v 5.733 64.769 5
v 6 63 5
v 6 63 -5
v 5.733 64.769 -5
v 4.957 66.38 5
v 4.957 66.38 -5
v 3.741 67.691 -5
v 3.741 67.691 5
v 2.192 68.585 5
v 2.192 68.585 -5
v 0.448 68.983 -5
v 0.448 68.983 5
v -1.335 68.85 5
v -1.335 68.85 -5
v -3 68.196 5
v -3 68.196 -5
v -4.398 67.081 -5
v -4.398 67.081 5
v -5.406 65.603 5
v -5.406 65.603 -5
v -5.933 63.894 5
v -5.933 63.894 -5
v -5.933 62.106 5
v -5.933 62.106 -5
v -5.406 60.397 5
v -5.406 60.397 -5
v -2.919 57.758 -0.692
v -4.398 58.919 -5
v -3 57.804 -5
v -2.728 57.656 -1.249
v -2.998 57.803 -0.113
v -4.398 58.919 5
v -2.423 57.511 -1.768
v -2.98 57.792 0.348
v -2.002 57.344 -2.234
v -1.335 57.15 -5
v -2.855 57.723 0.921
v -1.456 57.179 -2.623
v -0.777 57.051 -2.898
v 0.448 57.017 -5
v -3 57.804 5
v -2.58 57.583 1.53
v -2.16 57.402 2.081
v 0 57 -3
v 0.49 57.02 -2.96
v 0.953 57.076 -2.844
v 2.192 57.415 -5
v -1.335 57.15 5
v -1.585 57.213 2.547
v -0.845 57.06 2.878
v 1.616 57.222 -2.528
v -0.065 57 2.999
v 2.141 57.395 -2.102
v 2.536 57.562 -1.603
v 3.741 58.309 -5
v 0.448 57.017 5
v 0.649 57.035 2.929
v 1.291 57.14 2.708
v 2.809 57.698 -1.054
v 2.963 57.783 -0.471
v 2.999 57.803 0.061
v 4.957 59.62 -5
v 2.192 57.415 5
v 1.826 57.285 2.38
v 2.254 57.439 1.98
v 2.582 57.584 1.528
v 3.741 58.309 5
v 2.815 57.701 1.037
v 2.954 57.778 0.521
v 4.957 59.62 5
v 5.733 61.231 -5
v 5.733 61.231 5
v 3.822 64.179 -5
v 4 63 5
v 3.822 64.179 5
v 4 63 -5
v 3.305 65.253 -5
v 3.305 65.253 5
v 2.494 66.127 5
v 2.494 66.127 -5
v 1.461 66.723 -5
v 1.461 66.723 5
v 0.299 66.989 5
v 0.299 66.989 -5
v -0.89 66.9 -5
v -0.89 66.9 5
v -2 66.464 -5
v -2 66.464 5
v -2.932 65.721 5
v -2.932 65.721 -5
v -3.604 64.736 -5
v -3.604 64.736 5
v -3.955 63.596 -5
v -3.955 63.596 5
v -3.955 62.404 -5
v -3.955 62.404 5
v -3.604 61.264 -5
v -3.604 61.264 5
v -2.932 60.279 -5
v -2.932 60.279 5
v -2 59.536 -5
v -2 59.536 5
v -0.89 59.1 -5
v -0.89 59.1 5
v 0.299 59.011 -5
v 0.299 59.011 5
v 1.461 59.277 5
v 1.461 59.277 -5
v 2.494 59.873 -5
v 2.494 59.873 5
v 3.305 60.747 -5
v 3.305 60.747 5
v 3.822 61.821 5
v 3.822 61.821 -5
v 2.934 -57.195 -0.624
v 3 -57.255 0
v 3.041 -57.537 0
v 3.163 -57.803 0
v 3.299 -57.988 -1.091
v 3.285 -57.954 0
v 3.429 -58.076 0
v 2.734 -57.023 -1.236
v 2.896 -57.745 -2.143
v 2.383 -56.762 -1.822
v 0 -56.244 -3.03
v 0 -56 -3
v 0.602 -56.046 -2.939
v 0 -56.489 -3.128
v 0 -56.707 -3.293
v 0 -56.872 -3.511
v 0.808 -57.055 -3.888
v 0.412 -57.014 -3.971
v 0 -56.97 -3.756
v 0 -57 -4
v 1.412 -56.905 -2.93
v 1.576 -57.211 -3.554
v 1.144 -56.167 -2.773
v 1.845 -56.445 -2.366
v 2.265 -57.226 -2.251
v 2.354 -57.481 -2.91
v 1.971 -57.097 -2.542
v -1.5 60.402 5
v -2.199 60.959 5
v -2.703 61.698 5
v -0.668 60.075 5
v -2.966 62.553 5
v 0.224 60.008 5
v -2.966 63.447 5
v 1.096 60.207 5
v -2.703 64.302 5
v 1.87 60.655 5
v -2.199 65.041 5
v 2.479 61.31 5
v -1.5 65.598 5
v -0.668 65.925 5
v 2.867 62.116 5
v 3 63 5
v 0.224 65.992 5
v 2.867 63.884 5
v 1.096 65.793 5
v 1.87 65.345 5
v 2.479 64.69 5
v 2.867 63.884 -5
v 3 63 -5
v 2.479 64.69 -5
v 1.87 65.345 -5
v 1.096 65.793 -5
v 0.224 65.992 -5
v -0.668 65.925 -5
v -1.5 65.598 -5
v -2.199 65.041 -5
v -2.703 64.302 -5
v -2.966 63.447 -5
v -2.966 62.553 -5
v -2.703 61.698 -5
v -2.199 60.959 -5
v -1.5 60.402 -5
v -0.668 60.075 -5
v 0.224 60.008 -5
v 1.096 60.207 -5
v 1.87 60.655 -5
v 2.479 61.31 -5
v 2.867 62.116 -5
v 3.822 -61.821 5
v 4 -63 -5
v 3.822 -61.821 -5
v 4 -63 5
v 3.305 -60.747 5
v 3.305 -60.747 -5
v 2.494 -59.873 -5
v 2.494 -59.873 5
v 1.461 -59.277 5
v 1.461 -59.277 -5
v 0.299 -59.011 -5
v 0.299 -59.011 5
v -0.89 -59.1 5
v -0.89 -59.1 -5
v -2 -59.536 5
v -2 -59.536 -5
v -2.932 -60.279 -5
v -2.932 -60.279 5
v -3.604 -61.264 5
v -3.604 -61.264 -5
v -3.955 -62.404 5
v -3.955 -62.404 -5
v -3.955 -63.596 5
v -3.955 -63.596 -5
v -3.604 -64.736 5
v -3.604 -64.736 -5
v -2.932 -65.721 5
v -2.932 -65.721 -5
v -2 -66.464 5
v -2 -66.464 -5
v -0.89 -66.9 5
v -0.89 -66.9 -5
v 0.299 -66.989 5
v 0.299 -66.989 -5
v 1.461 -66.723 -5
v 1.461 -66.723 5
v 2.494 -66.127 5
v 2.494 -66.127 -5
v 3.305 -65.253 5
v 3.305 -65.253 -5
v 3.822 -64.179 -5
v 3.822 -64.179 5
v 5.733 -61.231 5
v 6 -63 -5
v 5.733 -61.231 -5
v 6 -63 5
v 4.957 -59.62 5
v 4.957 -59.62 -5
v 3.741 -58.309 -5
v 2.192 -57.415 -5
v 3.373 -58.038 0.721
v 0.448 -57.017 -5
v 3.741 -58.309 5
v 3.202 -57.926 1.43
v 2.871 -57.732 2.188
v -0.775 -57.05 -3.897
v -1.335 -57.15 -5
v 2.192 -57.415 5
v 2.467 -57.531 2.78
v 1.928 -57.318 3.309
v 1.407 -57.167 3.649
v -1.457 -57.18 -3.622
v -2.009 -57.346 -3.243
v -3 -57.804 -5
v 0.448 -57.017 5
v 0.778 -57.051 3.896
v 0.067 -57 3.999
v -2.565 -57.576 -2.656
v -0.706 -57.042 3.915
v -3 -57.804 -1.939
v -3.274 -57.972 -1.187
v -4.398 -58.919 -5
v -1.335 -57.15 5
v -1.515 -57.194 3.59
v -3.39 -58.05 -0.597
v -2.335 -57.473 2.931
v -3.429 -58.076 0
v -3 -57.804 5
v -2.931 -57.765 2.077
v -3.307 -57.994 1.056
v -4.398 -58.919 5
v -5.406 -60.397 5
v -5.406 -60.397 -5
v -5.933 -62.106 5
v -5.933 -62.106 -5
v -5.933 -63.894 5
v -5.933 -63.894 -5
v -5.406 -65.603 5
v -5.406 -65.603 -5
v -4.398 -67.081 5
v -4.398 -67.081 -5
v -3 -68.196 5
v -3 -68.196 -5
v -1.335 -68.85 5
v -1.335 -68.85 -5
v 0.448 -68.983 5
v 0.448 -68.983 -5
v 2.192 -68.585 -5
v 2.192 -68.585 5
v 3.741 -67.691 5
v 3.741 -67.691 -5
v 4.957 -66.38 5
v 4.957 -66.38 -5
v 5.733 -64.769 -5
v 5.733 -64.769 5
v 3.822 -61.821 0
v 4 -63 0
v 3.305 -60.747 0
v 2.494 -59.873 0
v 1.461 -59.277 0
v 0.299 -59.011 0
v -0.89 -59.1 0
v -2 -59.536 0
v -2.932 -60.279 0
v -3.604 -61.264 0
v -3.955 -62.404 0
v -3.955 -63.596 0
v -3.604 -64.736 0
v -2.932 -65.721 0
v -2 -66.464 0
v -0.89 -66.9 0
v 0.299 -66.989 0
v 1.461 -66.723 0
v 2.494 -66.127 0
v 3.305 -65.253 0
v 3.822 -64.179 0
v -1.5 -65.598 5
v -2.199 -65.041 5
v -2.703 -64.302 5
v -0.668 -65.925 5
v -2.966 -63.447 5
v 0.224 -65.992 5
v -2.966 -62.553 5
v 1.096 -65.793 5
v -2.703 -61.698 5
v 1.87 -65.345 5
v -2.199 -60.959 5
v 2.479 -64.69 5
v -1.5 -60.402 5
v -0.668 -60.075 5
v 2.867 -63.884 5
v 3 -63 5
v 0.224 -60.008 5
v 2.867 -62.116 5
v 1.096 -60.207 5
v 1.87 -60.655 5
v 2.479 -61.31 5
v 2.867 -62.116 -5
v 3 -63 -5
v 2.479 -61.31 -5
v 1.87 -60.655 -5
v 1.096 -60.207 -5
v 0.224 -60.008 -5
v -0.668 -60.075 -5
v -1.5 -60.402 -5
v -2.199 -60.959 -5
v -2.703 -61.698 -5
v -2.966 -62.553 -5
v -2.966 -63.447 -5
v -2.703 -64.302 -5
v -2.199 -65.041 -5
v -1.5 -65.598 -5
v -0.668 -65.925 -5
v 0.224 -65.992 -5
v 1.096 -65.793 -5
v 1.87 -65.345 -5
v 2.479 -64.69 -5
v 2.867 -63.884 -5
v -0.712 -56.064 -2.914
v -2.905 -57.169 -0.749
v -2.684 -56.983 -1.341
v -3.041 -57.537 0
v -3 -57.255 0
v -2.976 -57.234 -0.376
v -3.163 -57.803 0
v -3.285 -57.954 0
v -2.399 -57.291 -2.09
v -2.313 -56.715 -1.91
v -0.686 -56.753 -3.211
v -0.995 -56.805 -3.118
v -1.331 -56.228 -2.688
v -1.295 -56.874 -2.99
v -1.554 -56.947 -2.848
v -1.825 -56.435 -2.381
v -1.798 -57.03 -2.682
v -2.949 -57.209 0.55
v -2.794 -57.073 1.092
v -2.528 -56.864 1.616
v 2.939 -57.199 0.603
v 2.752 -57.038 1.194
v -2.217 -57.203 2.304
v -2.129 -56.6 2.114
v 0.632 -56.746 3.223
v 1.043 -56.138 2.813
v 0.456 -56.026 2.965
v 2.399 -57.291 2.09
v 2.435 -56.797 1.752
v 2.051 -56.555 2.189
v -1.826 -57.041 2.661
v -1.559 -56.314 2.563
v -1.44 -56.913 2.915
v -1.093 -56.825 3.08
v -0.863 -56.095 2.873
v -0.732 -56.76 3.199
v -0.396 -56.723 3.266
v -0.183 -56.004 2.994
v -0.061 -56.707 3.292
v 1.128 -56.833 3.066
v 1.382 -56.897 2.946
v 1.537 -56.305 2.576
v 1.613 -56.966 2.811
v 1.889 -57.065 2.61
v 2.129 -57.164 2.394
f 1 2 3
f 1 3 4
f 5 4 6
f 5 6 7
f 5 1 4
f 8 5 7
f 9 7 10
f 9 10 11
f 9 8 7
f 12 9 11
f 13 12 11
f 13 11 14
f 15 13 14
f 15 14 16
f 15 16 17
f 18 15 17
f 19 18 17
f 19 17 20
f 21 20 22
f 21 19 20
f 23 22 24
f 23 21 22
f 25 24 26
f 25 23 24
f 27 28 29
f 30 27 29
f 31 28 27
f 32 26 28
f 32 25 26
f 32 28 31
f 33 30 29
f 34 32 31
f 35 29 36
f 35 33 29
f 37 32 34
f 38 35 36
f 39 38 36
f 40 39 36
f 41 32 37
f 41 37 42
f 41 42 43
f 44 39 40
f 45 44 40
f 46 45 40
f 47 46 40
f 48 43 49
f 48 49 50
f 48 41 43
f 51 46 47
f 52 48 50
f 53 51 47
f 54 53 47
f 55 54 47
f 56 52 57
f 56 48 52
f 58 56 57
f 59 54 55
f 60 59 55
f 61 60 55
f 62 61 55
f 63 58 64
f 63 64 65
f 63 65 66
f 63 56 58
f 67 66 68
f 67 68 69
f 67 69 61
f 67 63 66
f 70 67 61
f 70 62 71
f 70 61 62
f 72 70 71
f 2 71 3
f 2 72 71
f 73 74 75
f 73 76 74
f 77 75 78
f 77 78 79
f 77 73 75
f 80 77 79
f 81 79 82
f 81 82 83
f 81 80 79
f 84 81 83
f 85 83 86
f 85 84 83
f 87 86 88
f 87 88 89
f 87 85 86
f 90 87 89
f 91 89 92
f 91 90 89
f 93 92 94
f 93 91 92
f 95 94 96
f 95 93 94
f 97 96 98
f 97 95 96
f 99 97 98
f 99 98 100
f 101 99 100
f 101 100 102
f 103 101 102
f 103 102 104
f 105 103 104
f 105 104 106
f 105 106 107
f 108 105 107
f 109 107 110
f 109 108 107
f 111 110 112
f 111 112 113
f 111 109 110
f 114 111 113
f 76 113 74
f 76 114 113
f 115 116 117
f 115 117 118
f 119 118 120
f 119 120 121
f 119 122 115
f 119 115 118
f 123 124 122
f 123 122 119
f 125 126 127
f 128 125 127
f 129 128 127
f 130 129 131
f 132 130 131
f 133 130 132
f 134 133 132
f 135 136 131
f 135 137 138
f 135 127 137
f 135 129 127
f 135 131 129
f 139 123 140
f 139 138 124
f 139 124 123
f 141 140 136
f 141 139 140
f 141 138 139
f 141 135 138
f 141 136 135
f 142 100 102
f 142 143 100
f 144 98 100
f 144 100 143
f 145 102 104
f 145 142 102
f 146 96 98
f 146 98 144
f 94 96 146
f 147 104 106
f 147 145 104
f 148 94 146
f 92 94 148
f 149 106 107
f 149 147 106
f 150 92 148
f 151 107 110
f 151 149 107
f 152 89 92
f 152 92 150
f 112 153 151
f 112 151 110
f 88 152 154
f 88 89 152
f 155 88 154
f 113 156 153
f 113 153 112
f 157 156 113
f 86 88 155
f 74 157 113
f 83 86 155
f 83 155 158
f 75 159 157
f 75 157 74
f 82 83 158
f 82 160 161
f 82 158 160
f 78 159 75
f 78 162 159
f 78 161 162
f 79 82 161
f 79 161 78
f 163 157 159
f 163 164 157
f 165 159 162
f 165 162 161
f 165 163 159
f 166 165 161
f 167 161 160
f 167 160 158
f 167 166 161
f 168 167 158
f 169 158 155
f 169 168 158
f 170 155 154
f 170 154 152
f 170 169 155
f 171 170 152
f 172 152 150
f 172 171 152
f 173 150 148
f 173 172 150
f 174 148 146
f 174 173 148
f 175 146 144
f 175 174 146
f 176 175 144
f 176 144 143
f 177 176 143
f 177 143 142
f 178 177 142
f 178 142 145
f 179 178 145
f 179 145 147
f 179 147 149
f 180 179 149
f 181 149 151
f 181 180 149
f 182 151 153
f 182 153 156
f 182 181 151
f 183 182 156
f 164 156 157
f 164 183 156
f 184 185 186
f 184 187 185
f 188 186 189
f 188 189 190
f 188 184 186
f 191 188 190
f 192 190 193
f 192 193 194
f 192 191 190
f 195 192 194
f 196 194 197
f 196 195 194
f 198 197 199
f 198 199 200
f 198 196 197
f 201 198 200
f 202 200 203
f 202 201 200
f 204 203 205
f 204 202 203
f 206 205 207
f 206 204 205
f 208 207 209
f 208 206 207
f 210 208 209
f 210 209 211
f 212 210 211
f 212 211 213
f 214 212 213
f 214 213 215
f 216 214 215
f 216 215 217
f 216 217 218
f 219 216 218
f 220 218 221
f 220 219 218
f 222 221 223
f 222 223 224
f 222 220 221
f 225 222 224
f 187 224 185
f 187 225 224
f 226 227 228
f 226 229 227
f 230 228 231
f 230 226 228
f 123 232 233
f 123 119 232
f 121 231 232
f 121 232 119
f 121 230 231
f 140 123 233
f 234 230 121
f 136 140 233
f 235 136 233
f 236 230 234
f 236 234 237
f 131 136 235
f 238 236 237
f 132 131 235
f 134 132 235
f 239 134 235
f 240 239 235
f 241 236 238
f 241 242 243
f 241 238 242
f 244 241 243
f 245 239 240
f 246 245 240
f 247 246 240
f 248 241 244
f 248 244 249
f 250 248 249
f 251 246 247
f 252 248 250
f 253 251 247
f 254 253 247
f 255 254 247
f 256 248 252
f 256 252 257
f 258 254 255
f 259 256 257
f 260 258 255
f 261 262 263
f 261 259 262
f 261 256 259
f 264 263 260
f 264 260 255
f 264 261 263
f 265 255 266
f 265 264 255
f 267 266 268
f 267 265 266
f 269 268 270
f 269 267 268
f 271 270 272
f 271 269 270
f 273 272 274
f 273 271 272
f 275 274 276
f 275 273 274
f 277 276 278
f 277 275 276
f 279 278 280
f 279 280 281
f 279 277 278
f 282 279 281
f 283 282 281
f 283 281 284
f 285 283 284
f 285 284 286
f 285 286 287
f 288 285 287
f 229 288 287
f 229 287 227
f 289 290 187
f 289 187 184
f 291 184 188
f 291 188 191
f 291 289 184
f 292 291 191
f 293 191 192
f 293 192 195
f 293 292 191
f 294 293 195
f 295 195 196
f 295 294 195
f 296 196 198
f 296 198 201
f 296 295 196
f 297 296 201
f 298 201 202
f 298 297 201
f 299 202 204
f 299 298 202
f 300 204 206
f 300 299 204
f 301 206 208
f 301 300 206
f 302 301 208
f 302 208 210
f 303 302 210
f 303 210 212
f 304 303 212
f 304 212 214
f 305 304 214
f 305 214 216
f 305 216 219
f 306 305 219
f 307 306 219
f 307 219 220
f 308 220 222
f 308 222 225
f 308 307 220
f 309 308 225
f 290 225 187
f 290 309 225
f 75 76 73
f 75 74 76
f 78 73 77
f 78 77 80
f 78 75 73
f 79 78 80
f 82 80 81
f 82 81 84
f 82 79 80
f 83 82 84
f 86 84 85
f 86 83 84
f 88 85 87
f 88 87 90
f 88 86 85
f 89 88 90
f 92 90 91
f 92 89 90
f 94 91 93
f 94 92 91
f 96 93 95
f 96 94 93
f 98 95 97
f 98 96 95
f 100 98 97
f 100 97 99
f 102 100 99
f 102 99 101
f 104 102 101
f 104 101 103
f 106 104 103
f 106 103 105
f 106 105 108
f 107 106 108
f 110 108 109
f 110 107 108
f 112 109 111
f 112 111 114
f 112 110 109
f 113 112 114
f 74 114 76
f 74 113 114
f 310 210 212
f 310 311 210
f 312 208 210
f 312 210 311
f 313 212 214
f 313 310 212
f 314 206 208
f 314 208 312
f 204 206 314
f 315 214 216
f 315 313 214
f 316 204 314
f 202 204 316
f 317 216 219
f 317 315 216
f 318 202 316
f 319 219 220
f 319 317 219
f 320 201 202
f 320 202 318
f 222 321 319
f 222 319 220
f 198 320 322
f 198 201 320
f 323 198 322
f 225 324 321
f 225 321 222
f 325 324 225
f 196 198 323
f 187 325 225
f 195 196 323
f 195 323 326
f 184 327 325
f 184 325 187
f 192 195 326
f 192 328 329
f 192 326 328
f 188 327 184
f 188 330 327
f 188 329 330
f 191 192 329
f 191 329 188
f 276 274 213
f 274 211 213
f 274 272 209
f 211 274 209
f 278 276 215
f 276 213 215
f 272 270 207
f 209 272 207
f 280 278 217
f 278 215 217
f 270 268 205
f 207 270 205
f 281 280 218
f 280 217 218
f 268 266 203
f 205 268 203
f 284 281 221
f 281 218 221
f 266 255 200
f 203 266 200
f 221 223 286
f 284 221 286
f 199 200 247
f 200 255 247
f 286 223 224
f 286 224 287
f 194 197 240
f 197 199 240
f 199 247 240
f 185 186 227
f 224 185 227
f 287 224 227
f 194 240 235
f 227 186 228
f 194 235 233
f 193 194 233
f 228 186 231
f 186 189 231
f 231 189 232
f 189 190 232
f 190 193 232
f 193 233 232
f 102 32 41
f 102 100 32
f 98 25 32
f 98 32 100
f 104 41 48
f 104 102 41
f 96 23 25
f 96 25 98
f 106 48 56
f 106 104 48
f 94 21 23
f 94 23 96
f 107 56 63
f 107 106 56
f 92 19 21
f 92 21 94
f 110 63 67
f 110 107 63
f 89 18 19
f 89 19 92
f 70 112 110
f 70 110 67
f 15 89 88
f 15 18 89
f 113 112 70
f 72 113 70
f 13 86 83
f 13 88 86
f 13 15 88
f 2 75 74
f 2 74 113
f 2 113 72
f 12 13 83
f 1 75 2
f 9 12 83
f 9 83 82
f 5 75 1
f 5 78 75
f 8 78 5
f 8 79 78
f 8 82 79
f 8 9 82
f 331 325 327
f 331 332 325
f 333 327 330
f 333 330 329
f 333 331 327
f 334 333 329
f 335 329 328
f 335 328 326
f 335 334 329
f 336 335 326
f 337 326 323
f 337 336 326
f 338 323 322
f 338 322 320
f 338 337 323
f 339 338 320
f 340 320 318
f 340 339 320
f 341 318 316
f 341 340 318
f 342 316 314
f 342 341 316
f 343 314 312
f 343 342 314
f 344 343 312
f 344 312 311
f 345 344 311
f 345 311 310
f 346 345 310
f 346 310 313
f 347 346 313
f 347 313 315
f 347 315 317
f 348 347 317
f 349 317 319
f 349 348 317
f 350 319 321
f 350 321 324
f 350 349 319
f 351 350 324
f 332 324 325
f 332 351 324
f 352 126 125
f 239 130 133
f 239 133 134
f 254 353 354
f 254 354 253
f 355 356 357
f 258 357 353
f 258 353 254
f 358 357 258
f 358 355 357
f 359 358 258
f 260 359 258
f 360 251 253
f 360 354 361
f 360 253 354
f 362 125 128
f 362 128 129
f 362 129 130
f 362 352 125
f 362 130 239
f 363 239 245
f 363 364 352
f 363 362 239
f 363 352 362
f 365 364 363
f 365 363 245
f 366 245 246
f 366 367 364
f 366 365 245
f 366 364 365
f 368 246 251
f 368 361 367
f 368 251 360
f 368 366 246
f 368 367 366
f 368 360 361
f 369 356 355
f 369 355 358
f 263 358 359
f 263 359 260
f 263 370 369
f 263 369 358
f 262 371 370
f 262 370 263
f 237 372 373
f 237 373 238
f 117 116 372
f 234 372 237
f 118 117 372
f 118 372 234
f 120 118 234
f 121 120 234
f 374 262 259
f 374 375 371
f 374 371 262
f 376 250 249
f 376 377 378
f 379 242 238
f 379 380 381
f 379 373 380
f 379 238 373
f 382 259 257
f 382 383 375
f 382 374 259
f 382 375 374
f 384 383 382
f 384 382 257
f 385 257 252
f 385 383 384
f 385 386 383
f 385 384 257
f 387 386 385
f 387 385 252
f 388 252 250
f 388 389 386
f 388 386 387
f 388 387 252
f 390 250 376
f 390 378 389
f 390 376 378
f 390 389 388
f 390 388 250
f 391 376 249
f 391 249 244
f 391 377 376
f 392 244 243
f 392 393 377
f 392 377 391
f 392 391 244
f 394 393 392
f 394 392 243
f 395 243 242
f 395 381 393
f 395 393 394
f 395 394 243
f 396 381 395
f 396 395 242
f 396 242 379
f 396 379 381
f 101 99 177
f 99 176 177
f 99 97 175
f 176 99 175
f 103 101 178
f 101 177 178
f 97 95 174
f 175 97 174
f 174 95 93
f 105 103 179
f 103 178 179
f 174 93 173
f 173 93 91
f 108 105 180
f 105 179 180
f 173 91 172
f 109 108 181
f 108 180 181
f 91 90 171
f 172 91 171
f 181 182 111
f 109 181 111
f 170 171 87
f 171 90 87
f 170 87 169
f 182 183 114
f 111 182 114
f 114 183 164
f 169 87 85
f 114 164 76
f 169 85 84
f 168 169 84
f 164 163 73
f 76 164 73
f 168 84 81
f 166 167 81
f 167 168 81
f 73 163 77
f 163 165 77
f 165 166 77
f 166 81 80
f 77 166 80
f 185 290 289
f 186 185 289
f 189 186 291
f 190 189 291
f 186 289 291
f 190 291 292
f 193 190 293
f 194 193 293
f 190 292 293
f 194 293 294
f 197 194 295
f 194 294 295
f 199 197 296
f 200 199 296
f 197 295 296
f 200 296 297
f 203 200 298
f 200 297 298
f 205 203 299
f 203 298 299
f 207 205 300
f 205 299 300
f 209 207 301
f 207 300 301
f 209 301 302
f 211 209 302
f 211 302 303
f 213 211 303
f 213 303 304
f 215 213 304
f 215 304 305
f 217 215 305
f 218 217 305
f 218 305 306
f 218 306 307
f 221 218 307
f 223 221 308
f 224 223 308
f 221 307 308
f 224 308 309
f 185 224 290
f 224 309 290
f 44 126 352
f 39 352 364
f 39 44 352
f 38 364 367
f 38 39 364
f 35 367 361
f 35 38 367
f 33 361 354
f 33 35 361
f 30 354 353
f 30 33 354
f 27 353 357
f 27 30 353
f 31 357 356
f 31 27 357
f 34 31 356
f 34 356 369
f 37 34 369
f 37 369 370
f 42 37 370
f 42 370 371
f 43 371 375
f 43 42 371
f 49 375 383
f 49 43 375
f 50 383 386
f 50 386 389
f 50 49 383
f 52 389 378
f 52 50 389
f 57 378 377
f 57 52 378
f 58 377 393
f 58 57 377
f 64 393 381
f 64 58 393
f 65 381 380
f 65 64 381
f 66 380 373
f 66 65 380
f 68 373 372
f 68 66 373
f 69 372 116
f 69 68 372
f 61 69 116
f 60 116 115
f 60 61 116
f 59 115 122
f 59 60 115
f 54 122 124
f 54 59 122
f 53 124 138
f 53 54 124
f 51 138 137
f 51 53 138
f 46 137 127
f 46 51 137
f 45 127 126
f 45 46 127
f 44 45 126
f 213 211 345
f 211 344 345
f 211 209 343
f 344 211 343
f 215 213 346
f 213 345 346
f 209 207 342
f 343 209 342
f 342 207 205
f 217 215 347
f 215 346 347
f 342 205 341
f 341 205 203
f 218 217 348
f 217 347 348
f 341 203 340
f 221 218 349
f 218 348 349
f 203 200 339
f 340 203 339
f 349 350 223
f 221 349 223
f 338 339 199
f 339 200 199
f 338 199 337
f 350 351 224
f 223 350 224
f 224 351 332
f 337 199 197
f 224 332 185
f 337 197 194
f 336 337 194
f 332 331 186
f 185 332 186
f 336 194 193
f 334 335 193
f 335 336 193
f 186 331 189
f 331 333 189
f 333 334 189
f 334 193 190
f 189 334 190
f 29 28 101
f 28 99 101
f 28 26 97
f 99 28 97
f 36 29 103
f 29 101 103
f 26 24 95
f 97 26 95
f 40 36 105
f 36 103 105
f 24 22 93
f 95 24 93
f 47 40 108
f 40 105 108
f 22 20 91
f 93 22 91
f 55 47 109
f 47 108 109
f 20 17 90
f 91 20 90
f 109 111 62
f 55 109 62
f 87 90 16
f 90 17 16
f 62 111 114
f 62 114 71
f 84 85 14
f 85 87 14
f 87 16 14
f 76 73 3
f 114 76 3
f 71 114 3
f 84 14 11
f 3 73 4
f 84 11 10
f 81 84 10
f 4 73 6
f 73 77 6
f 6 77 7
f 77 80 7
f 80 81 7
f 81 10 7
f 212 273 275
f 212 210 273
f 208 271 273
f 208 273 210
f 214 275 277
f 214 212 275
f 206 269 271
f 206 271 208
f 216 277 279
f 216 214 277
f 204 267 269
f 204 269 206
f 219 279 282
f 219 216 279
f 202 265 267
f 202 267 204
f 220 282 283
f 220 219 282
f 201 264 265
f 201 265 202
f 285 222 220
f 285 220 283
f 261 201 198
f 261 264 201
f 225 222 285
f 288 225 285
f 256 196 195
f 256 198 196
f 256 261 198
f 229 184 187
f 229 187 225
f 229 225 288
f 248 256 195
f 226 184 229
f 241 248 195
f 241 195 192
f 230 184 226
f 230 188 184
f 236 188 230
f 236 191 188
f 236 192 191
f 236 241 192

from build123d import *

# Parameters (mm, degrees)
SKETCH1_R             = 3
BOSS_EXTRUDE1_DEPTH   = 58
SKETCH2_R             = 6
SKETCH2_R_2           = 4
BOSS_EXTRUDE2_DEPTH   = 5
SKETCH3_R             = 4
SKETCH3_R_2           = 3
BOSS_EXTRUDE3_DEPTH   = 5
BOSS_EXTRUDE3_2_DEPTH = 5
FILLET1_R             = 1


with BuildPart() as part:
    # Sketch1 → Boss-Extrude1 (new, symmetric)
    with BuildSketch(Plane(origin=(0, 0, 0), x_dir=(1, 0, 0), z_dir=(0, 1, 0))):
        with Locations(Location((0, 0, 0), (0, 0, 90))):
            Circle(SKETCH1_R)
    extrude(amount=BOSS_EXTRUDE1_DEPTH, both=True)

    # Sketch2 → Boss-Extrude2 (add, symmetric)
    # profile 1 of 2: a face of its own
    with BuildSketch(Plane.XY):
        with Locations((0, -63)):
            Circle(SKETCH2_R)
        with Locations((0, -63)):
            Circle(SKETCH2_R_2, mode=Mode.SUBTRACT)
    # profile 2 of 2: a face of its own
    with BuildSketch(Plane.XY):
        with Locations((0, 63)):
            Circle(SKETCH2_R)
        with Locations((0, 63)):
            Circle(SKETCH2_R_2, mode=Mode.SUBTRACT)
    extrude(amount=BOSS_EXTRUDE2_DEPTH, both=True)

    # Fillet1
    fillet1_edges = [part.edges().sort_by_distance(p)[0] for p in [
        (0, -57, 3.000000001),
    ]]
    fillet(fillet1_edges, radius=FILLET1_R)


with BuildPart() as body_2:
    # Sketch3 → Boss-Extrude3 (new, symmetric)
    with BuildSketch(Plane.XY):
        with Locations((0, -63)):
            Circle(SKETCH3_R)
        with Locations((0, -63)):
            Circle(SKETCH3_R_2, mode=Mode.SUBTRACT)
    extrude(amount=BOSS_EXTRUDE3_DEPTH, both=True)


with BuildPart() as body_3:
    # Sketch3 → Boss-Extrude3 2 (new, symmetric)
    with BuildSketch(Plane.XY):
        with Locations((0, 63)):
            Circle(SKETCH3_R)
        with Locations((0, 63)):
            Circle(SKETCH3_R_2, mode=Mode.SUBTRACT)
    extrude(amount=BOSS_EXTRUDE3_2_DEPTH, both=True)


solid = Compound([part.part, body_2.part, body_3.part])
